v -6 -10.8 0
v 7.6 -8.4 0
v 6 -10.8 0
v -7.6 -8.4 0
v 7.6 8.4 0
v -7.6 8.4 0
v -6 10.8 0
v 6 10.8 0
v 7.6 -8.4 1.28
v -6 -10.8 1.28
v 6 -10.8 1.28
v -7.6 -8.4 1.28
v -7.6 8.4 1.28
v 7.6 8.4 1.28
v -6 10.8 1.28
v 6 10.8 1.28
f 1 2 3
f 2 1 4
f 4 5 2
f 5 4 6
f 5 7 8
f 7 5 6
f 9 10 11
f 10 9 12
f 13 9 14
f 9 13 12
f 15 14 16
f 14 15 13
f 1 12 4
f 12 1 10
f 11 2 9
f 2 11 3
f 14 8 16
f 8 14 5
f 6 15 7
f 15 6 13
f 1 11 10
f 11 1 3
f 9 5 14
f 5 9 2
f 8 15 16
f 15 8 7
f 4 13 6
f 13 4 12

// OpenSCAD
// file: ../p/4-4edge.scad
use <../lib.scad>
$fa=1; $fs=0.2;
function ldraw_lib__4_4edge(realsolid=false) = [
// 0 Circle 1.0
// 0 Name: 4-4edge.dat
// 0 Author: James Jessiman
// 0 !LDRAW_ORG Primitive UPDATE 2017-01
// 0 !LICENSE Licensed under CC BY 2.0 and CC BY 4.0 : see CAreadme.txt
// 
// 0 BFC CERTIFY CCW
  [0,"BFC","CERTIFY"],
  [0,"BFC","CCW"],
// 
// 0 !HISTORY 1998-12-15 [PTadmin] Official Update 1998-10
// 0 !HISTORY 2005-12-28 [PTadmin] Official Update 2005-01
// 0 !HISTORY 2007-06-24 [PTadmin] Header formatted for Contributor Agreement
// 0 !HISTORY 2008-07-01 [PTadmin] Official Update 2008-01
// 0 !HISTORY 2017-01-15 [Steffen] BFCed
// 0 !HISTORY 2017-12-30 [PTadmin] Official Update 2017-01
// 
// 
// 2 24 1 0 0 0.9239 0 0.3827
  [2,24,1,0,0,0.9239,0,0.3827],
// 2 24 0.9239 0 0.3827 0.7071 0 0.7071
  [2,24,0.9239,0,0.3827,0.7071,0,0.7071],
// 2 24 0.7071 0 0.7071 0.3827 0 0.9239
  [2,24,0.7071,0,0.7071,0.3827,0,0.9239],
// 2 24 0.3827 0 0.9239 0 0 1
  [2,24,0.3827,0,0.9239,0,0,1],
// 2 24 0 0 1 -0.3827 0 0.9239
  [2,24,0,0,1,-0.3827,0,0.9239],
// 2 24 -0.3827 0 0.9239 -0.7071 0 0.7071
  [2,24,-0.3827,0,0.9239,-0.7071,0,0.7071],
// 2 24 -0.7071 0 0.7071 -0.9239 0 0.3827
  [2,24,-0.7071,0,0.7071,-0.9239,0,0.3827],
// 2 24 -0.9239 0 0.3827 -1 0 -0
  [2,24,-0.9239,0,0.3827,-1,0,-0],
// 2 24 -1 0 -0 -0.9239 0 -0.3827
  [2,24,-1,0,-0,-0.9239,0,-0.3827],
// 2 24 -0.9239 0 -0.3827 -0.7071 0 -0.7071
  [2,24,-0.9239,0,-0.3827,-0.7071,0,-0.7071],
// 2 24 -0.7071 0 -0.7071 -0.3827 0 -0.9239
  [2,24,-0.7071,0,-0.7071,-0.3827,0,-0.9239],
// 2 24 -0.3827 0 -0.9239 0 0 -1
  [2,24,-0.3827,0,-0.9239,0,0,-1],
// 2 24 0 0 -1 0.3827 0 -0.9239
  [2,24,0,0,-1,0.3827,0,-0.9239],
// 2 24 0.3827 0 -0.9239 0.7071 0 -0.7071
  [2,24,0.3827,0,-0.9239,0.7071,0,-0.7071],
// 2 24 0.7071 0 -0.7071 0.9239 0 -0.3827
  [2,24,0.7071,0,-0.7071,0.9239,0,-0.3827],
// 2 24 0.9239 0 -0.3827 1 0 0
  [2,24,0.9239,0,-0.3827,1,0,0],
];
module ldraw_lib__4_4edge(step=0, col=false, unit=2/5, alt=false, line=0.2, solid=!$preview)
    makepoly(ldraw_lib__4_4edge(solid), step=step, col=col, unit=unit, alt=alt, line=line, solid=solid);
ldraw_lib__4_4edge(line=0.2);
// file: ../p/4-4disc.scad
use <../lib.scad>
$fa=1; $fs=0.2;
function ldraw_lib__4_4disc(realsolid=false) = [
// 0 Disc 1.0
// 0 Name: 4-4disc.dat
// 0 Author: James Jessiman
// 0 !LDRAW_ORG Primitive UPDATE 2002-02
// 0 !LICENSE Licensed under CC BY 2.0 and CC BY 4.0 : see CAreadme.txt
// 
// 0 BFC CERTIFY CCW
  [0,"BFC","CERTIFY"],
  [0,"BFC","CCW"],
// 
// 0 !HISTORY 1998-12-15 [PTadmin] Official Update 1998-10
// 0 !HISTORY 2002-03-23 [sbliss] Added BFC statement
// 0 !HISTORY 2002-04-25 [PTadmin] Official Update 2002-02
// 0 !HISTORY 2007-06-24 [PTadmin] Header formatted for Contributor Agreement
// 0 !HISTORY 2008-07-01 [PTadmin] Official Update 2008-01
// 
// 
// 3 16 0 0 0 1 0 0 0.9239 0 0.3827
  [3,16,0,0,0,1,0,0,0.9239,0,0.3827],
// 3 16 0 0 0 0.9239 0 0.3827 0.7071 0 0.7071
  [3,16,0,0,0,0.9239,0,0.3827,0.7071,0,0.7071],
// 3 16 0 0 0 0.7071 0 0.7071 0.3827 0 0.9239
  [3,16,0,0,0,0.7071,0,0.7071,0.3827,0,0.9239],
// 3 16 0 0 0 0.3827 0 0.9239 0 0 1
  [3,16,0,0,0,0.3827,0,0.9239,0,0,1],
// 3 16 0 0 0 0 0 1 -0.3827 0 0.9239
  [3,16,0,0,0,0,0,1,-0.3827,0,0.9239],
// 3 16 0 0 0 -0.3827 0 0.9239 -0.7071 0 0.7071
  [3,16,0,0,0,-0.3827,0,0.9239,-0.7071,0,0.7071],
// 3 16 0 0 0 -0.7071 0 0.7071 -0.9239 0 0.3827
  [3,16,0,0,0,-0.7071,0,0.7071,-0.9239,0,0.3827],
// 3 16 0 0 0 -0.9239 0 0.3827 -1 0 -0
  [3,16,0,0,0,-0.9239,0,0.3827,-1,0,-0],
// 3 16 0 0 0 -1 0 -0 -0.9239 0 -0.3827
  [3,16,0,0,0,-1,0,-0,-0.9239,0,-0.3827],
// 3 16 0 0 0 -0.9239 0 -0.3827 -0.7071 0 -0.7071
  [3,16,0,0,0,-0.9239,0,-0.3827,-0.7071,0,-0.7071],
// 3 16 0 0 0 -0.7071 0 -0.7071 -0.3827 0 -0.9239
  [3,16,0,0,0,-0.7071,0,-0.7071,-0.3827,0,-0.9239],
// 3 16 0 0 0 -0.3827 0 -0.9239 0 0 -1
  [3,16,0,0,0,-0.3827,0,-0.9239,0,0,-1],
// 3 16 0 0 0 0 0 -1 0.3827 0 -0.9239
  [3,16,0,0,0,0,0,-1,0.3827,0,-0.9239],
// 3 16 0 0 0 0.3827 0 -0.9239 0.7071 0 -0.7071
  [3,16,0,0,0,0.3827,0,-0.9239,0.7071,0,-0.7071],
// 3 16 0 0 0 0.7071 0 -0.7071 0.9239 0 -0.3827
  [3,16,0,0,0,0.7071,0,-0.7071,0.9239,0,-0.3827],
// 3 16 0 0 0 0.9239 0 -0.3827 1 0 0
  [3,16,0,0,0,0.9239,0,-0.3827,1,0,0],
// 0
];
module ldraw_lib__4_4disc(step=0, col=false, unit=2/5, alt=false, line=0.2, solid=!$preview)
    makepoly(ldraw_lib__4_4disc(solid), step=step, col=col, unit=unit, alt=alt, line=line, solid=solid);
ldraw_lib__4_4disc(line=0.2);
// file: ../p/4-4cyli.scad
use <../lib.scad>
$fa=1; $fs=0.2;
function ldraw_lib__4_4cyli(realsolid=false) = [
// 0 Cylinder 1.0
// 0 Name: 4-4cyli.dat
// 0 Author: James Jessiman
// 0 !LDRAW_ORG Primitive UPDATE 2005-01
// 0 !LICENSE Licensed under CC BY 2.0 and CC BY 4.0 : see CAreadme.txt
// 
// 0 BFC CERTIFY CCW
  [0,"BFC","CERTIFY"],
  [0,"BFC","CCW"],
// 
// 0 !HISTORY 1998-12-15 [PTadmin] Official Update 1998-10
// 0 !HISTORY 2002-03-23 [sbliss] Added BFC statement; merged headers from files in distributions LDraw 0.27 and Complete.
// 0 !HISTORY 2002-04-25 [PTadmin] Official Update 2002-02
// 0 !HISTORY 2004-12-14 [guyvivan] BFC CCW
// 0 !HISTORY 2005-12-28 [PTadmin] Official Update 2005-01
// 0 !HISTORY 2007-06-24 [PTadmin] Header formatted for Contributor Agreement
// 0 !HISTORY 2008-07-01 [PTadmin] Official Update 2008-01
// 
// 
// 4 16 1 1 0 0.9239 1 0.3827 0.9239 0 0.3827 1 0 0
  [4,16,1,1,0,0.9239,1,0.3827,0.9239,0,0.3827,1,0,0],
// 5 24 1 0 0 1 1 0 0.9239 0 0.3827 0.9239 0 -0.3827
  [5,24,1,0,0,1,1,0,0.9239,0,0.3827,0.9239,0,-0.3827],
// 4 16 0.9239 1 0.3827 0.7071 1 0.7071 0.7071 0 0.7071 0.9239 0 0.3827
  [4,16,0.9239,1,0.3827,0.7071,1,0.7071,0.7071,0,0.7071,0.9239,0,0.3827],
// 5 24 0.9239 0 0.3827 0.9239 1 0.3827 0.7071 0 0.7071 1 0 0
  [5,24,0.9239,0,0.3827,0.9239,1,0.3827,0.7071,0,0.7071,1,0,0],
// 4 16 0.7071 1 0.7071 0.3827 1 0.9239 0.3827 0 0.9239 0.7071 0 0.7071
  [4,16,0.7071,1,0.7071,0.3827,1,0.9239,0.3827,0,0.9239,0.7071,0,0.7071],
// 5 24 0.7071 0 0.7071 0.7071 1 0.7071 0.3827 0 0.9239 0.9239 0 0.3827
  [5,24,0.7071,0,0.7071,0.7071,1,0.7071,0.3827,0,0.9239,0.9239,0,0.3827],
// 4 16 0.3827 1 0.9239 0 1 1 0 0 1 0.3827 0 0.9239
  [4,16,0.3827,1,0.9239,0,1,1,0,0,1,0.3827,0,0.9239],
// 5 24 0.3827 0 0.9239 0.3827 1 0.9239 0 0 1 0.7071 0 0.7071
  [5,24,0.3827,0,0.9239,0.3827,1,0.9239,0,0,1,0.7071,0,0.7071],
// 4 16 0 1 1 -0.3827 1 0.9239 -0.3827 0 0.9239 0 0 1
  [4,16,0,1,1,-0.3827,1,0.9239,-0.3827,0,0.9239,0,0,1],
// 5 24 0 0 1 0 1 1 -0.3827 0 0.9239 0.3827 0 0.9239
  [5,24,0,0,1,0,1,1,-0.3827,0,0.9239,0.3827,0,0.9239],
// 4 16 -0.3827 1 0.9239 -0.7071 1 0.7071 -0.7071 0 0.7071 -0.3827 0 0.9239
  [4,16,-0.3827,1,0.9239,-0.7071,1,0.7071,-0.7071,0,0.7071,-0.3827,0,0.9239],
// 5 24 -0.3827 0 0.9239 -0.3827 1 0.9239 -0.7071 0 0.7071 0 0 1
  [5,24,-0.3827,0,0.9239,-0.3827,1,0.9239,-0.7071,0,0.7071,0,0,1],
// 4 16 -0.7071 1 0.7071 -0.9239 1 0.3827 -0.9239 0 0.3827 -0.7071 0 0.7071
  [4,16,-0.7071,1,0.7071,-0.9239,1,0.3827,-0.9239,0,0.3827,-0.7071,0,0.7071],
// 5 24 -0.7071 0 0.7071 -0.7071 1 0.7071 -0.9239 0 0.3827 -0.3827 0 0.9239
  [5,24,-0.7071,0,0.7071,-0.7071,1,0.7071,-0.9239,0,0.3827,-0.3827,0,0.9239],
// 4 16 -0.9239 1 0.3827 -1 1 0 -1 0 0 -0.9239 0 0.3827
  [4,16,-0.9239,1,0.3827,-1,1,0,-1,0,0,-0.9239,0,0.3827],
// 5 24 -0.9239 0 0.3827 -0.9239 1 0.3827 -1 0 0 -0.7071 0 0.7071
  [5,24,-0.9239,0,0.3827,-0.9239,1,0.3827,-1,0,0,-0.7071,0,0.7071],
// 4 16 -1 1 0 -0.9239 1 -0.3827 -0.9239 0 -0.3827 -1 0 0
  [4,16,-1,1,0,-0.9239,1,-0.3827,-0.9239,0,-0.3827,-1,0,0],
// 5 24 -1 0 0 -1 1 0 -0.9239 0 -0.3827 -0.9239 0 0.3827
  [5,24,-1,0,0,-1,1,0,-0.9239,0,-0.3827,-0.9239,0,0.3827],
// 4 16 -0.9239 1 -0.3827 -0.7071 1 -0.7071 -0.7071 0 -0.7071 -0.9239 0 -0.3827
  [4,16,-0.9239,1,-0.3827,-0.7071,1,-0.7071,-0.7071,0,-0.7071,-0.9239,0,-0.3827],
// 5 24 -0.9239 0 -0.3827 -0.9239 1 -0.3827 -0.7071 0 -0.7071 -1 0 0
  [5,24,-0.9239,0,-0.3827,-0.9239,1,-0.3827,-0.7071,0,-0.7071,-1,0,0],
// 4 16 -0.7071 1 -0.7071 -0.3827 1 -0.9239 -0.3827 0 -0.9239 -0.7071 0 -0.7071
  [4,16,-0.7071,1,-0.7071,-0.3827,1,-0.9239,-0.3827,0,-0.9239,-0.7071,0,-0.7071],
// 5 24 -0.7071 0 -0.7071 -0.7071 1 -0.7071 -0.3827 0 -0.9239 -0.9239 0 -0.3827
  [5,24,-0.7071,0,-0.7071,-0.7071,1,-0.7071,-0.3827,0,-0.9239,-0.9239,0,-0.3827],
// 4 16 -0.3827 1 -0.9239 0 1 -1 0 0 -1 -0.3827 0 -0.9239
  [4,16,-0.3827,1,-0.9239,0,1,-1,0,0,-1,-0.3827,0,-0.9239],
// 5 24 -0.3827 0 -0.9239 -0.3827 1 -0.9239 0 0 -1 -0.7071 0 -0.7071
  [5,24,-0.3827,0,-0.9239,-0.3827,1,-0.9239,0,0,-1,-0.7071,0,-0.7071],
// 4 16 0 1 -1 0.3827 1 -0.9239 0.3827 0 -0.9239 0 0 -1
  [4,16,0,1,-1,0.3827,1,-0.9239,0.3827,0,-0.9239,0,0,-1],
// 5 24 0 0 -1 0 1 -1 0.3827 0 -0.9239 -0.3827 0 -0.9239
  [5,24,0,0,-1,0,1,-1,0.3827,0,-0.9239,-0.3827,0,-0.9239],
// 4 16 0.3827 1 -0.9239 0.7071 1 -0.7071 0.7071 0 -0.7071 0.3827 0 -0.9239
  [4,16,0.3827,1,-0.9239,0.7071,1,-0.7071,0.7071,0,-0.7071,0.3827,0,-0.9239],
// 5 24 0.3827 0 -0.9239 0.3827 1 -0.9239 0.7071 0 -0.7071 0 0 -1
  [5,24,0.3827,0,-0.9239,0.3827,1,-0.9239,0.7071,0,-0.7071,0,0,-1],
// 4 16 0.7071 1 -0.7071 0.9239 1 -0.3827 0.9239 0 -0.3827 0.7071 0 -0.7071
  [4,16,0.7071,1,-0.7071,0.9239,1,-0.3827,0.9239,0,-0.3827,0.7071,0,-0.7071],
// 5 24 0.7071 0 -0.7071 0.7071 1 -0.7071 0.9239 0 -0.3827 0.3827 0 -0.9239
  [5,24,0.7071,0,-0.7071,0.7071,1,-0.7071,0.9239,0,-0.3827,0.3827,0,-0.9239],
// 4 16 0.9239 1 -0.3827 1 1 0 1 0 0 0.9239 0 -0.3827
  [4,16,0.9239,1,-0.3827,1,1,0,1,0,0,0.9239,0,-0.3827],
// 5 24 0.9239 0 -0.3827 0.9239 1 -0.3827 1 0 0 0.7071 0 -0.7071
  [5,24,0.9239,0,-0.3827,0.9239,1,-0.3827,1,0,0,0.7071,0,-0.7071],
// 0
];
module ldraw_lib__4_4cyli(step=0, col=false, unit=2/5, alt=false, line=0.2, solid=!$preview)
    makepoly(ldraw_lib__4_4cyli(solid), step=step, col=col, unit=unit, alt=alt, line=line, solid=solid);
ldraw_lib__4_4cyli(line=0.2);
// file: ../p/stud3.scad
use <../lib.scad>
use <4-4cyli.scad>
use <4-4disc.scad>
use <4-4edge.scad>
$fa=1; $fs=0.2;
function ldraw_lib__stud3(realsolid=false) = realsolid ? 
    [openscad(translate([0,0,-eps()], o=cylinder(4+eps(), r=4)),2)] : [
// 0 Stud Tube Solid
// 0 Name: stud3.dat
// 0 Author: James Jessiman
// 0 !LDRAW_ORG Primitive UPDATE 2012-01
// 0 !LICENSE Licensed under CC BY 2.0 and CC BY 4.0 : see CAreadme.txt
// 
// 0 BFC CERTIFY CCW
  [0,"BFC","CERTIFY"],
  [0,"BFC","CCW"],
// 
// 0 !HISTORY 2002-04-04 [sbliss] Modified for BFC compliance
// 0 !HISTORY 2002-04-25 [PTadmin] Official Update 2002-02
// 0 !HISTORY 2007-06-24 [PTadmin] Header formatted for Contributor Agreement
// 0 !HISTORY 2008-07-01 [PTadmin] Official Update 2008-01
// 0 !HISTORY 2012-02-16 [Philo] Changed to CCW
// 0 !HISTORY 2012-03-30 [PTadmin] Official Update 2012-01
// 
// 
// 1 16 0 -4 0 4 0 0 0 1 0 0 0 4 4-4edge.dat
  [1,16,0,-4,0,4,0,0,0,1,0,0,0,4, ldraw_lib__4_4edge(realsolid)],
// 1 16 0 0 0 4 0 0 0 1 0 0 0 4 4-4edge.dat
  [1,16,0,0,0,4,0,0,0,1,0,0,0,4, ldraw_lib__4_4edge(realsolid)],
// 1 16 0 -4 0 4 0 0 0 1 0 0 0 4 4-4disc.dat
  [1,16,0,-4,0,4,0,0,0,1,0,0,0,4, ldraw_lib__4_4disc(realsolid)],
// 1 16 0 -4 0 4 0 0 0 4 0 0 0 4 4-4cyli.dat
  [1,16,0,-4,0,4,0,0,0,4,0,0,0,4, ldraw_lib__4_4cyli(realsolid)],
];
module ldraw_lib__stud3(step=0, col=false, unit=2/5, alt=false, line=0.2, solid=!$preview)
    makepoly(ldraw_lib__stud3(solid), step=step, col=col, unit=unit, alt=alt, line=line, solid=solid);
ldraw_lib__stud3(line=0.2);
// file: ../p/stud.scad
use <../lib.scad>
use <4-4cyli.scad>
use <4-4disc.scad>
use <4-4edge.scad>
$fa=1; $fs=0.2;
function ldraw_lib__stud(realsolid=false) = realsolid ? 
    [openscad(translate([0,0,-eps()], o=cylinder(4+eps(), r=6)),2)] : [
// 0 Stud
// 0 Name: stud.dat
// 0 Author: James Jessiman
// 0 !LDRAW_ORG Primitive UPDATE 2012-01
// 0 !LICENSE Licensed under CC BY 2.0 and CC BY 4.0 : see CAreadme.txt
// 
// 0 BFC CERTIFY CCW
  [0,"BFC","CERTIFY"],
  [0,"BFC","CCW"],
// 
// 0 !HISTORY 2002-04-04 [sbliss] Modified for BFC compliance
// 0 !HISTORY 2002-04-25 [PTadmin] Official Update 2002-02
// 0 !HISTORY 2007-06-24 [PTadmin] Header formatted for Contributor Agreement
// 0 !HISTORY 2008-07-01 [PTadmin] Official Update 2008-01
// 0 !HISTORY 2012-02-16 [Philo] Changed to CCW
// 0 !HISTORY 2012-03-30 [PTadmin] Official Update 2012-01
// 
// 
// 1 16 0 0 0 6 0 0 0 1 0 0 0 6 4-4edge.dat
  [1,16,0,0,0,6,0,0,0,1,0,0,0,6, ldraw_lib__4_4edge(realsolid)],
// 1 16 0 -4 0 6 0 0 0 1 0 0 0 6 4-4edge.dat
  [1,16,0,-4,0,6,0,0,0,1,0,0,0,6, ldraw_lib__4_4edge(realsolid)],
// 1 16 0 0 0 6 0 0 0 -4 0 0 0 6 4-4cyli.dat
  [1,16,0,0,0,6,0,0,0,-4,0,0,0,6, ldraw_lib__4_4cyli(realsolid)],
// 1 16 0 -4 0 6 0 0 0 1 0 0 0 6 4-4disc.dat
  [1,16,0,-4,0,6,0,0,0,1,0,0,0,6, ldraw_lib__4_4disc(realsolid)],
];
module ldraw_lib__stud(step=0, col=false, unit=2/5, alt=false, line=0.2, solid=!$preview)
    makepoly(ldraw_lib__stud(solid), step=step, col=col, unit=unit, alt=alt, line=line, solid=solid);
ldraw_lib__stud(line=0.2);
// file: ../p/box5.scad
use <../lib.scad>
$fa=1; $fs=0.2;
function ldraw_lib__box5(realsolid=false) = [
// 0 Box with 5 Faces and All Edges
// 0 Name: box5.dat
// 0 Author: James Jessiman
// 0 !LDRAW_ORG Primitive UPDATE 2012-01
// 0 !LICENSE Licensed under CC BY 2.0 and CC BY 4.0 : see CAreadme.txt
// 
// 0 BFC CERTIFY CCW
  [0,"BFC","CERTIFY"],
  [0,"BFC","CCW"],
// 
// 0 !HISTORY 2002-04-03 [sbliss] Modified for BFC compliance
// 0 !HISTORY 2002-04-25 [PTadmin] Official Update 2002-02
// 0 !HISTORY 2007-06-24 [PTadmin] Header formatted for Contributor Agreement
// 0 !HISTORY 2008-07-01 [PTadmin] Official Update 2008-01
// 0 !HISTORY 2012-02-16 [Philo] Changed to CCW
// 0 !HISTORY 2012-03-30 [PTadmin] Official Update 2012-01
// 
// 
// 2 24 1 1 1 -1 1 1
  [2,24,1,1,1,-1,1,1],
// 2 24 -1 1 1 -1 1 -1
  [2,24,-1,1,1,-1,1,-1],
// 2 24 -1 1 -1 1 1 -1
  [2,24,-1,1,-1,1,1,-1],
// 2 24 1 1 -1 1 1 1
  [2,24,1,1,-1,1,1,1],
// 2 24 1 0 1 -1 0 1
  [2,24,1,0,1,-1,0,1],
// 2 24 -1 0 1 -1 0 -1
  [2,24,-1,0,1,-1,0,-1],
// 2 24 -1 0 -1 1 0 -1
  [2,24,-1,0,-1,1,0,-1],
// 2 24 1 0 -1 1 0 1
  [2,24,1,0,-1,1,0,1],
// 2 24 1 0 1 1 1 1
  [2,24,1,0,1,1,1,1],
// 2 24 -1 0 1 -1 1 1
  [2,24,-1,0,1,-1,1,1],
// 2 24 1 0 -1 1 1 -1
  [2,24,1,0,-1,1,1,-1],
// 2 24 -1 0 -1 -1 1 -1
  [2,24,-1,0,-1,-1,1,-1],
// 4 16 -1 1 1 1 1 1 1 1 -1 -1 1 -1
  [4,16,-1,1,1,1,1,1,1,1,-1,-1,1,-1],
// 4 16 -1 1 1 -1 0 1 1 0 1 1 1 1
  [4,16,-1,1,1,-1,0,1,1,0,1,1,1,1],
// 4 16 -1 1 -1 -1 0 -1 -1 0 1 -1 1 1
  [4,16,-1,1,-1,-1,0,-1,-1,0,1,-1,1,1],
// 4 16 1 1 -1 1 0 -1 -1 0 -1 -1 1 -1
  [4,16,1,1,-1,1,0,-1,-1,0,-1,-1,1,-1],
// 4 16 1 1 1 1 0 1 1 0 -1 1 1 -1
  [4,16,1,1,1,1,0,1,1,0,-1,1,1,-1],
];
module ldraw_lib__box5(step=0, col=false, unit=2/5, alt=false, line=0.2, solid=!$preview)
    makepoly(ldraw_lib__box5(solid), step=step, col=col, unit=unit, alt=alt, line=line, solid=solid);
ldraw_lib__box5(line=0.2);
// file: ../p/box4t.scad
use <../lib.scad>
$fa=1; $fs=0.2;
function ldraw_lib__box4t(realsolid=false) = [
// 0 Box with 4 Adjacent Faces and All Edges
// 0 Name: box4t.dat
// 0 Author: Tore Eriksson [Tore_Eriksson]
// 0 !LDRAW_ORG Primitive UPDATE 2003-02
// 0 !LICENSE Licensed under CC BY 2.0 and CC BY 4.0 : see CAreadme.txt
// 
// 0 BFC CERTIFY CCW
  [0,"BFC","CERTIFY"],
  [0,"BFC","CCW"],
// 
// 0 !HISTORY 1997-09-29 [PTadmin] Official Update 1997-15
// 0 !HISTORY 2002-08-31 [izanette] Modified with WINDZ for BFC compliance
// 0 !HISTORY 2003-08-01 [PTadmin] Official Update 2003-02
// 0 !HISTORY 2007-06-24 [PTadmin] Header formatted for Contributor Agreement
// 0 !HISTORY 2008-07-01 [PTadmin] Official Update 2008-01
// 
// 
// 2 24 1 1 1 -1 1 1
  [2,24,1,1,1,-1,1,1],
// 2 24 -1 1 1 -1 1 -1
  [2,24,-1,1,1,-1,1,-1],
// 2 24 -1 1 -1 1 1 -1
  [2,24,-1,1,-1,1,1,-1],
// 2 24 1 1 -1 1 1 1
  [2,24,1,1,-1,1,1,1],
// 2 24 1 0 1 -1 0 1
  [2,24,1,0,1,-1,0,1],
// 2 24 -1 0 1 -1 0 -1
  [2,24,-1,0,1,-1,0,-1],
// 2 24 -1 0 -1 1 0 -1
  [2,24,-1,0,-1,1,0,-1],
// 2 24 1 0 -1 1 0 1
  [2,24,1,0,-1,1,0,1],
// 2 24 1 0 1 1 1 1
  [2,24,1,0,1,1,1,1],
// 2 24 -1 0 1 -1 1 1
  [2,24,-1,0,1,-1,1,1],
// 2 24 1 0 -1 1 1 -1
  [2,24,1,0,-1,1,1,-1],
// 2 24 -1 0 -1 -1 1 -1
  [2,24,-1,0,-1,-1,1,-1],
// 4 16 1 1 1 1 1 -1 -1 1 -1 -1 1 1
  [4,16,1,1,1,1,1,-1,-1,1,-1,-1,1,1],
// 4 16 1 1 1 -1 1 1 -1 0 1 1 0 1
  [4,16,1,1,1,-1,1,1,-1,0,1,1,0,1],
// 4 16 -1 1 1 -1 1 -1 -1 0 -1 -1 0 1
  [4,16,-1,1,1,-1,1,-1,-1,0,-1,-1,0,1],
// 0 4 16 -1 1 -1 -1 0 -1 1 0 -1 1 1 -1
// 4 16 1 1 -1 1 1 1 1 0 1 1 0 -1
  [4,16,1,1,-1,1,1,1,1,0,1,1,0,-1],
// 0
];
module ldraw_lib__box4t(step=0, col=false, unit=2/5, alt=false, line=0.2, solid=!$preview)
    makepoly(ldraw_lib__box4t(solid), step=step, col=col, unit=unit, alt=alt, line=line, solid=solid);
ldraw_lib__box4t(line=0.2);
// file: s/3004s01.scad
use <../../lib.scad>
use <../../p/box4t.scad>
use <../../p/box5.scad>
use <../../p/stud.scad>
use <../../p/stud3.scad>
$fa=1; $fs=0.2;
function ldraw_lib__s__3004s01(realsolid=false) = [
// 0 ~Brick  1 x  2 without Front Face
// 0 Name: s\3004s01.dat
// 0 Author: James Jessiman
// 0 !LDRAW_ORG Subpart UPDATE 2003-03
// 0 !LICENSE Licensed under CC BY 2.0 and CC BY 4.0 : see CAreadme.txt
// 
// 0 BFC CERTIFY CCW
  [0,"BFC","CERTIFY"],
  [0,"BFC","CCW"],
// 
// 0 !HISTORY 2003-09-07 [jriley] Subfiling, BFC
// 0 !HISTORY 2003-12-19 [PTadmin] Official Update 2003-03
// 0 !HISTORY 2007-08-29 [PTadmin] Header formatted for Contributor Agreement
// 0 !HISTORY 2008-07-01 [PTadmin] Official Update 2008-01
// 
// 
// 1 16 0 4 0 1 0 0 0 -5 0 0 0 1 stud3.dat
  [1,16,0,4,0,1,0,0,0,-5,0,0,0,1, ldraw_lib__stud3(realsolid)],
// 0 BFC INVERTNEXT
  [0,"BFC","INVERTNEXT"],
// 1 16 0 24 0 16 0 0 0 -20 0 0 0 6 box5.dat
  [1,16,0,24,0,16,0,0,0,-20,0,0,0,6, ldraw_lib__box5(realsolid)],
// 4 16 20 24 10 16 24 6 -16 24 6 -20 24 10
  [4,16,20,24,10,16,24,6,-16,24,6,-20,24,10],
// 4 16 -20 24 10 -16 24 6 -16 24 -6 -20 24 -10
  [4,16,-20,24,10,-16,24,6,-16,24,-6,-20,24,-10],
// 4 16 -20 24 -10 -16 24 -6 16 24 -6 20 24 -10
  [4,16,-20,24,-10,-16,24,-6,16,24,-6,20,24,-10],
// 4 16 20 24 -10 16 24 -6 16 24 6 20 24 10
  [4,16,20,24,-10,16,24,-6,16,24,6,20,24,10],
// 1 16 0 24 0 20 0 0 0 -24 0 0 0 10 box4t.dat
  [1,16,0,24,0,20,0,0,0,-24,0,0,0,10, ldraw_lib__box4t(realsolid)],
// 1 16 10 0 0 1 0 0 0 1 0 0 0 1 stud.dat
  [1,16,10,0,0,1,0,0,0,1,0,0,0,1, ldraw_lib__stud(realsolid)],
// 1 16 -10 0 0 1 0 0 0 1 0 0 0 1 stud.dat
  [1,16,-10,0,0,1,0,0,0,1,0,0,0,1, ldraw_lib__stud(realsolid)],
// 0
];
module ldraw_lib__s__3004s01(step=0, col=false, unit=2/5, alt=false, line=0.2, solid=!$preview)
    makepoly(ldraw_lib__s__3004s01(solid), step=step, col=col, unit=unit, alt=alt, line=line, solid=solid);
ldraw_lib__s__3004s01(line=0.2);
// file: 3004.scad
use <../lib.scad>
use <s/3004s01.scad>
$fa=1; $fs=0.2;
function ldraw_lib__3004(realsolid=false) = [
// 0 Brick  1 x  2
// 0 Name: 3004.dat
// 0 Author: James Jessiman
// 0 !LDRAW_ORG Part UPDATE 2022-05
// 0 !LICENSE Licensed under CC BY 2.0 and CC BY 4.0 : see CAreadme.txt
// 
// 0 BFC CERTIFY CCW
  [0,"BFC","CERTIFY"],
  [0,"BFC","CCW"],
// 
// 0 !HISTORY 2001-10-26 [PTadmin] Official Update 2001-01
// 0 !HISTORY 2002-05-07 {unknown} BFC Certification
// 0 !HISTORY 2002-06-11 [PTadmin] Official Update 2002-03
// 0 !HISTORY 2007-05-07 [PTadmin] Header formatted for Contributor Agreement
// 0 !HISTORY 2008-07-01 [PTadmin] Official Update 2008-01
// 0 !HISTORY 2022-08-04 [MagFors] Using subfile
// 0 !HISTORY 2022-09-15 [PTadmin] Official Update 2022-05
// 
// 
// 1 16 0 0 0 1 0 0 0 1 0 0 0 1 s\3004s01.dat
  [1,16,0,0,0,1,0,0,0,1,0,0,0,1, ldraw_lib__s__3004s01(realsolid)],
// 4 16 -20 24 -10 20 24 -10 20 0 -10 -20 0 -10
  [4,16,-20,24,-10,20,24,-10,20,0,-10,-20,0,-10],
];
module ldraw_lib__3004(step=0, col=false, unit=2/5, alt=false, line=0.2, solid=!$preview)
    makepoly(ldraw_lib__3004(solid), step=step, col=col, unit=unit, alt=alt, line=line, solid=solid);
ldraw_lib__3004(line=0.2);
// file: ../p/rect2p.scad
use <../lib.scad>
$fa=1; $fs=0.2;
function ldraw_lib__rect2p(realsolid=false) = [
// 0 Rectangle with 2 Parallel Edges
// 0 Name: rect2p.dat
// 0 Author: Donald Sutter [technog]
// 0 !LDRAW_ORG Primitive UPDATE 2010-01
// 0 !LICENSE Licensed under CC BY 2.0 and CC BY 4.0 : see CAreadme.txt
// 
// 0 BFC CERTIFY CCW
  [0,"BFC","CERTIFY"],
  [0,"BFC","CCW"],
// 
// 0 !HISTORY 2003-08-01 [PTadmin] Official Update 2003-02
// 0 !HISTORY 2007-06-24 [PTadmin] Header formatted for Contributor Agreement
// 0 !HISTORY 2008-07-01 [PTadmin] Official Update 2008-01
// 0 !HISTORY 2010-01-17 [mikeheide] changed winding to CCW
// 0 !HISTORY 2010-04-05 [PTadmin] Official Update 2010-01
// 
// 
// 2 24 1 0 1 -1 0 1
  [2,24,1,0,1,-1,0,1],
// 2 24 -1 0 -1 1 0 -1
  [2,24,-1,0,-1,1,0,-1],
// 4 16 -1 0 1 -1 0 -1 1 0 -1 1 0 1
  [4,16,-1,0,1,-1,0,-1,1,0,-1,1,0,1],
// 0
];
module ldraw_lib__rect2p(step=0, col=false, unit=2/5, alt=false, line=0.2, solid=!$preview)
    makepoly(ldraw_lib__rect2p(solid), step=step, col=col, unit=unit, alt=alt, line=line, solid=solid);
ldraw_lib__rect2p(line=0.2);
// file: ../p/rect.scad
use <../lib.scad>
$fa=1; $fs=0.2;
function ldraw_lib__rect(realsolid=false) = [
// 0 Rectangle
// 0 Name: rect.dat
// 0 Author: James Jessiman
// 0 !LDRAW_ORG Primitive UPDATE 2010-01
// 0 !LICENSE Licensed under CC BY 2.0 and CC BY 4.0 : see CAreadme.txt
// 
// 0 BFC CERTIFY CCW
  [0,"BFC","CERTIFY"],
  [0,"BFC","CCW"],
// 
// 0 !HISTORY 2002-04-05 [hafhead] Added BFC statement
// 0 !HISTORY 2002-04-25 [PTadmin] Official Update 2002-02
// 0 !HISTORY 2007-06-24 [PTadmin] Header formatted for Contributor Agreement
// 0 !HISTORY 2008-07-01 [PTadmin] Official Update 2008-01
// 0 !HISTORY 2010-01-17 [mikeheide] changed winding to CCW
// 0 !HISTORY 2010-04-05 [PTadmin] Official Update 2010-01
// 
// 
// 2 24 1 0 1 -1 0 1
  [2,24,1,0,1,-1,0,1],
// 2 24 -1 0 1 -1 0 -1
  [2,24,-1,0,1,-1,0,-1],
// 2 24 -1 0 -1 1 0 -1
  [2,24,-1,0,-1,1,0,-1],
// 2 24 1 0 -1 1 0 1
  [2,24,1,0,-1,1,0,1],
// 4 16 -1 0 1 -1 0 -1 1 0 -1 1 0 1
  [4,16,-1,0,1,-1,0,-1,1,0,-1,1,0,1],
// 0
];
module ldraw_lib__rect(step=0, col=false, unit=2/5, alt=false, line=0.2, solid=!$preview)
    makepoly(ldraw_lib__rect(solid), step=step, col=col, unit=unit, alt=alt, line=line, solid=solid);
ldraw_lib__rect(line=0.2);
// main file
use <../lib.scad>
use <../p/rect.scad>
use <../p/rect2p.scad>
$fa=1; $fs=0.2;
function ldraw_lib__t1108(realsolid=false) = [
// 0 ~| Circuit Cubes Buzzer Bottom Plate
// 0 Name: t1108.dat
// 0 Author: Philippe Hurbain [Philo]
// 0 !LDRAW_ORG Part UPDATE 2022-05
// 0 !LICENSE Licensed under CC BY 2.0 and CC BY 4.0 : see CAreadme.txt
// 
// 0 BFC CERTIFY CCW
  [0,"BFC","CERTIFY"],
  [0,"BFC","CCW"],
// 
// 0 !CATEGORY Electric
// 
// 0 !HISTORY 2022-09-15 [PTadmin] Official Update 2022-05
// 
// 
// 4 16 15 0 -27 -15 0 -27 -19 0 -21 19 0 -21
  [4,16,15,0,-27,-15,0,-27,-19,0,-21,19,0,-21],
// 1 16 0 0 0 0 0 19 0 -1 0 21 0 0 rect2p.dat
  [1,16,0,0,0,0,0,19,0,-1,0,21,0,0, ldraw_lib__rect2p(realsolid)],
// 4 16 19 0 21 -19 0 21 -15 0 27 15 0 27
  [4,16,19,0,21,-19,0,21,-15,0,27,15,0,27],
// 4 16 -19 -3.2 -21 -15 -3.2 -27 15 -3.2 -27 19 -3.2 -21
  [4,16,-19,-3.2,-21,-15,-3.2,-27,15,-3.2,-27,19,-3.2,-21],
// 1 16 0 -3.2 0 0 0 19 0 1 0 -21 0 0 rect2p.dat
  [1,16,0,-3.2,0,0,0,19,0,1,0,-21,0,0, ldraw_lib__rect2p(realsolid)],
// 4 16 -15 -3.2 27 -19 -3.2 21 19 -3.2 21 15 -3.2 27
  [4,16,-15,-3.2,27,-19,-3.2,21,19,-3.2,21,15,-3.2,27],
// 1 16 -17 -1.6 -24 0 1 2 1.6 0 0 0 0 -3 rect.dat
  [1,16,-17,-1.6,-24,0,1,2,1.6,0,0,0,0,-3, ldraw_lib__rect(realsolid)],
// 1 16 17 -1.6 -24 0 -1 -2 -1.6 0 0 0 0 -3 rect.dat
  [1,16,17,-1.6,-24,0,-1,-2,-1.6,0,0,0,0,-3, ldraw_lib__rect(realsolid)],
// 1 16 17 -1.6 24 0 -1 -2 1.6 0 0 0 0 3 rect.dat
  [1,16,17,-1.6,24,0,-1,-2,1.6,0,0,0,0,3, ldraw_lib__rect(realsolid)],
// 1 16 -17 -1.6 24 0 1 2 -1.6 0 0 0 0 3 rect.dat
  [1,16,-17,-1.6,24,0,1,2,-1.6,0,0,0,0,3, ldraw_lib__rect(realsolid)],
// 1 16 0 -1.6 -27 -15 0 0 0 0 1.6 0 1 0 rect2p.dat
  [1,16,0,-1.6,-27,-15,0,0,0,0,1.6,0,1,0, ldraw_lib__rect2p(realsolid)],
// 4 16 19 0 21 19 -3.2 21 19 -3.2 -21 19 0 -21
  [4,16,19,0,21,19,-3.2,21,19,-3.2,-21,19,0,-21],
// 1 16 0 -1.6 27 15 0 0 0 0 1.6 0 -1 0 rect2p.dat
  [1,16,0,-1.6,27,15,0,0,0,0,1.6,0,-1,0, ldraw_lib__rect2p(realsolid)],
// 4 16 -19 0 -21 -19 -3.2 -21 -19 -3.2 21 -19 0 21
  [4,16,-19,0,-21,-19,-3.2,-21,-19,-3.2,21,-19,0,21],
];
module ldraw_lib__t1108(step=0, col=false, unit=2/5, alt=false, line=0.2, solid=!$preview)
    makepoly(ldraw_lib__t1108(solid), step=step, col=col, unit=unit, alt=alt, line=line, solid=solid);
ldraw_lib__t1108(line=0.2);
